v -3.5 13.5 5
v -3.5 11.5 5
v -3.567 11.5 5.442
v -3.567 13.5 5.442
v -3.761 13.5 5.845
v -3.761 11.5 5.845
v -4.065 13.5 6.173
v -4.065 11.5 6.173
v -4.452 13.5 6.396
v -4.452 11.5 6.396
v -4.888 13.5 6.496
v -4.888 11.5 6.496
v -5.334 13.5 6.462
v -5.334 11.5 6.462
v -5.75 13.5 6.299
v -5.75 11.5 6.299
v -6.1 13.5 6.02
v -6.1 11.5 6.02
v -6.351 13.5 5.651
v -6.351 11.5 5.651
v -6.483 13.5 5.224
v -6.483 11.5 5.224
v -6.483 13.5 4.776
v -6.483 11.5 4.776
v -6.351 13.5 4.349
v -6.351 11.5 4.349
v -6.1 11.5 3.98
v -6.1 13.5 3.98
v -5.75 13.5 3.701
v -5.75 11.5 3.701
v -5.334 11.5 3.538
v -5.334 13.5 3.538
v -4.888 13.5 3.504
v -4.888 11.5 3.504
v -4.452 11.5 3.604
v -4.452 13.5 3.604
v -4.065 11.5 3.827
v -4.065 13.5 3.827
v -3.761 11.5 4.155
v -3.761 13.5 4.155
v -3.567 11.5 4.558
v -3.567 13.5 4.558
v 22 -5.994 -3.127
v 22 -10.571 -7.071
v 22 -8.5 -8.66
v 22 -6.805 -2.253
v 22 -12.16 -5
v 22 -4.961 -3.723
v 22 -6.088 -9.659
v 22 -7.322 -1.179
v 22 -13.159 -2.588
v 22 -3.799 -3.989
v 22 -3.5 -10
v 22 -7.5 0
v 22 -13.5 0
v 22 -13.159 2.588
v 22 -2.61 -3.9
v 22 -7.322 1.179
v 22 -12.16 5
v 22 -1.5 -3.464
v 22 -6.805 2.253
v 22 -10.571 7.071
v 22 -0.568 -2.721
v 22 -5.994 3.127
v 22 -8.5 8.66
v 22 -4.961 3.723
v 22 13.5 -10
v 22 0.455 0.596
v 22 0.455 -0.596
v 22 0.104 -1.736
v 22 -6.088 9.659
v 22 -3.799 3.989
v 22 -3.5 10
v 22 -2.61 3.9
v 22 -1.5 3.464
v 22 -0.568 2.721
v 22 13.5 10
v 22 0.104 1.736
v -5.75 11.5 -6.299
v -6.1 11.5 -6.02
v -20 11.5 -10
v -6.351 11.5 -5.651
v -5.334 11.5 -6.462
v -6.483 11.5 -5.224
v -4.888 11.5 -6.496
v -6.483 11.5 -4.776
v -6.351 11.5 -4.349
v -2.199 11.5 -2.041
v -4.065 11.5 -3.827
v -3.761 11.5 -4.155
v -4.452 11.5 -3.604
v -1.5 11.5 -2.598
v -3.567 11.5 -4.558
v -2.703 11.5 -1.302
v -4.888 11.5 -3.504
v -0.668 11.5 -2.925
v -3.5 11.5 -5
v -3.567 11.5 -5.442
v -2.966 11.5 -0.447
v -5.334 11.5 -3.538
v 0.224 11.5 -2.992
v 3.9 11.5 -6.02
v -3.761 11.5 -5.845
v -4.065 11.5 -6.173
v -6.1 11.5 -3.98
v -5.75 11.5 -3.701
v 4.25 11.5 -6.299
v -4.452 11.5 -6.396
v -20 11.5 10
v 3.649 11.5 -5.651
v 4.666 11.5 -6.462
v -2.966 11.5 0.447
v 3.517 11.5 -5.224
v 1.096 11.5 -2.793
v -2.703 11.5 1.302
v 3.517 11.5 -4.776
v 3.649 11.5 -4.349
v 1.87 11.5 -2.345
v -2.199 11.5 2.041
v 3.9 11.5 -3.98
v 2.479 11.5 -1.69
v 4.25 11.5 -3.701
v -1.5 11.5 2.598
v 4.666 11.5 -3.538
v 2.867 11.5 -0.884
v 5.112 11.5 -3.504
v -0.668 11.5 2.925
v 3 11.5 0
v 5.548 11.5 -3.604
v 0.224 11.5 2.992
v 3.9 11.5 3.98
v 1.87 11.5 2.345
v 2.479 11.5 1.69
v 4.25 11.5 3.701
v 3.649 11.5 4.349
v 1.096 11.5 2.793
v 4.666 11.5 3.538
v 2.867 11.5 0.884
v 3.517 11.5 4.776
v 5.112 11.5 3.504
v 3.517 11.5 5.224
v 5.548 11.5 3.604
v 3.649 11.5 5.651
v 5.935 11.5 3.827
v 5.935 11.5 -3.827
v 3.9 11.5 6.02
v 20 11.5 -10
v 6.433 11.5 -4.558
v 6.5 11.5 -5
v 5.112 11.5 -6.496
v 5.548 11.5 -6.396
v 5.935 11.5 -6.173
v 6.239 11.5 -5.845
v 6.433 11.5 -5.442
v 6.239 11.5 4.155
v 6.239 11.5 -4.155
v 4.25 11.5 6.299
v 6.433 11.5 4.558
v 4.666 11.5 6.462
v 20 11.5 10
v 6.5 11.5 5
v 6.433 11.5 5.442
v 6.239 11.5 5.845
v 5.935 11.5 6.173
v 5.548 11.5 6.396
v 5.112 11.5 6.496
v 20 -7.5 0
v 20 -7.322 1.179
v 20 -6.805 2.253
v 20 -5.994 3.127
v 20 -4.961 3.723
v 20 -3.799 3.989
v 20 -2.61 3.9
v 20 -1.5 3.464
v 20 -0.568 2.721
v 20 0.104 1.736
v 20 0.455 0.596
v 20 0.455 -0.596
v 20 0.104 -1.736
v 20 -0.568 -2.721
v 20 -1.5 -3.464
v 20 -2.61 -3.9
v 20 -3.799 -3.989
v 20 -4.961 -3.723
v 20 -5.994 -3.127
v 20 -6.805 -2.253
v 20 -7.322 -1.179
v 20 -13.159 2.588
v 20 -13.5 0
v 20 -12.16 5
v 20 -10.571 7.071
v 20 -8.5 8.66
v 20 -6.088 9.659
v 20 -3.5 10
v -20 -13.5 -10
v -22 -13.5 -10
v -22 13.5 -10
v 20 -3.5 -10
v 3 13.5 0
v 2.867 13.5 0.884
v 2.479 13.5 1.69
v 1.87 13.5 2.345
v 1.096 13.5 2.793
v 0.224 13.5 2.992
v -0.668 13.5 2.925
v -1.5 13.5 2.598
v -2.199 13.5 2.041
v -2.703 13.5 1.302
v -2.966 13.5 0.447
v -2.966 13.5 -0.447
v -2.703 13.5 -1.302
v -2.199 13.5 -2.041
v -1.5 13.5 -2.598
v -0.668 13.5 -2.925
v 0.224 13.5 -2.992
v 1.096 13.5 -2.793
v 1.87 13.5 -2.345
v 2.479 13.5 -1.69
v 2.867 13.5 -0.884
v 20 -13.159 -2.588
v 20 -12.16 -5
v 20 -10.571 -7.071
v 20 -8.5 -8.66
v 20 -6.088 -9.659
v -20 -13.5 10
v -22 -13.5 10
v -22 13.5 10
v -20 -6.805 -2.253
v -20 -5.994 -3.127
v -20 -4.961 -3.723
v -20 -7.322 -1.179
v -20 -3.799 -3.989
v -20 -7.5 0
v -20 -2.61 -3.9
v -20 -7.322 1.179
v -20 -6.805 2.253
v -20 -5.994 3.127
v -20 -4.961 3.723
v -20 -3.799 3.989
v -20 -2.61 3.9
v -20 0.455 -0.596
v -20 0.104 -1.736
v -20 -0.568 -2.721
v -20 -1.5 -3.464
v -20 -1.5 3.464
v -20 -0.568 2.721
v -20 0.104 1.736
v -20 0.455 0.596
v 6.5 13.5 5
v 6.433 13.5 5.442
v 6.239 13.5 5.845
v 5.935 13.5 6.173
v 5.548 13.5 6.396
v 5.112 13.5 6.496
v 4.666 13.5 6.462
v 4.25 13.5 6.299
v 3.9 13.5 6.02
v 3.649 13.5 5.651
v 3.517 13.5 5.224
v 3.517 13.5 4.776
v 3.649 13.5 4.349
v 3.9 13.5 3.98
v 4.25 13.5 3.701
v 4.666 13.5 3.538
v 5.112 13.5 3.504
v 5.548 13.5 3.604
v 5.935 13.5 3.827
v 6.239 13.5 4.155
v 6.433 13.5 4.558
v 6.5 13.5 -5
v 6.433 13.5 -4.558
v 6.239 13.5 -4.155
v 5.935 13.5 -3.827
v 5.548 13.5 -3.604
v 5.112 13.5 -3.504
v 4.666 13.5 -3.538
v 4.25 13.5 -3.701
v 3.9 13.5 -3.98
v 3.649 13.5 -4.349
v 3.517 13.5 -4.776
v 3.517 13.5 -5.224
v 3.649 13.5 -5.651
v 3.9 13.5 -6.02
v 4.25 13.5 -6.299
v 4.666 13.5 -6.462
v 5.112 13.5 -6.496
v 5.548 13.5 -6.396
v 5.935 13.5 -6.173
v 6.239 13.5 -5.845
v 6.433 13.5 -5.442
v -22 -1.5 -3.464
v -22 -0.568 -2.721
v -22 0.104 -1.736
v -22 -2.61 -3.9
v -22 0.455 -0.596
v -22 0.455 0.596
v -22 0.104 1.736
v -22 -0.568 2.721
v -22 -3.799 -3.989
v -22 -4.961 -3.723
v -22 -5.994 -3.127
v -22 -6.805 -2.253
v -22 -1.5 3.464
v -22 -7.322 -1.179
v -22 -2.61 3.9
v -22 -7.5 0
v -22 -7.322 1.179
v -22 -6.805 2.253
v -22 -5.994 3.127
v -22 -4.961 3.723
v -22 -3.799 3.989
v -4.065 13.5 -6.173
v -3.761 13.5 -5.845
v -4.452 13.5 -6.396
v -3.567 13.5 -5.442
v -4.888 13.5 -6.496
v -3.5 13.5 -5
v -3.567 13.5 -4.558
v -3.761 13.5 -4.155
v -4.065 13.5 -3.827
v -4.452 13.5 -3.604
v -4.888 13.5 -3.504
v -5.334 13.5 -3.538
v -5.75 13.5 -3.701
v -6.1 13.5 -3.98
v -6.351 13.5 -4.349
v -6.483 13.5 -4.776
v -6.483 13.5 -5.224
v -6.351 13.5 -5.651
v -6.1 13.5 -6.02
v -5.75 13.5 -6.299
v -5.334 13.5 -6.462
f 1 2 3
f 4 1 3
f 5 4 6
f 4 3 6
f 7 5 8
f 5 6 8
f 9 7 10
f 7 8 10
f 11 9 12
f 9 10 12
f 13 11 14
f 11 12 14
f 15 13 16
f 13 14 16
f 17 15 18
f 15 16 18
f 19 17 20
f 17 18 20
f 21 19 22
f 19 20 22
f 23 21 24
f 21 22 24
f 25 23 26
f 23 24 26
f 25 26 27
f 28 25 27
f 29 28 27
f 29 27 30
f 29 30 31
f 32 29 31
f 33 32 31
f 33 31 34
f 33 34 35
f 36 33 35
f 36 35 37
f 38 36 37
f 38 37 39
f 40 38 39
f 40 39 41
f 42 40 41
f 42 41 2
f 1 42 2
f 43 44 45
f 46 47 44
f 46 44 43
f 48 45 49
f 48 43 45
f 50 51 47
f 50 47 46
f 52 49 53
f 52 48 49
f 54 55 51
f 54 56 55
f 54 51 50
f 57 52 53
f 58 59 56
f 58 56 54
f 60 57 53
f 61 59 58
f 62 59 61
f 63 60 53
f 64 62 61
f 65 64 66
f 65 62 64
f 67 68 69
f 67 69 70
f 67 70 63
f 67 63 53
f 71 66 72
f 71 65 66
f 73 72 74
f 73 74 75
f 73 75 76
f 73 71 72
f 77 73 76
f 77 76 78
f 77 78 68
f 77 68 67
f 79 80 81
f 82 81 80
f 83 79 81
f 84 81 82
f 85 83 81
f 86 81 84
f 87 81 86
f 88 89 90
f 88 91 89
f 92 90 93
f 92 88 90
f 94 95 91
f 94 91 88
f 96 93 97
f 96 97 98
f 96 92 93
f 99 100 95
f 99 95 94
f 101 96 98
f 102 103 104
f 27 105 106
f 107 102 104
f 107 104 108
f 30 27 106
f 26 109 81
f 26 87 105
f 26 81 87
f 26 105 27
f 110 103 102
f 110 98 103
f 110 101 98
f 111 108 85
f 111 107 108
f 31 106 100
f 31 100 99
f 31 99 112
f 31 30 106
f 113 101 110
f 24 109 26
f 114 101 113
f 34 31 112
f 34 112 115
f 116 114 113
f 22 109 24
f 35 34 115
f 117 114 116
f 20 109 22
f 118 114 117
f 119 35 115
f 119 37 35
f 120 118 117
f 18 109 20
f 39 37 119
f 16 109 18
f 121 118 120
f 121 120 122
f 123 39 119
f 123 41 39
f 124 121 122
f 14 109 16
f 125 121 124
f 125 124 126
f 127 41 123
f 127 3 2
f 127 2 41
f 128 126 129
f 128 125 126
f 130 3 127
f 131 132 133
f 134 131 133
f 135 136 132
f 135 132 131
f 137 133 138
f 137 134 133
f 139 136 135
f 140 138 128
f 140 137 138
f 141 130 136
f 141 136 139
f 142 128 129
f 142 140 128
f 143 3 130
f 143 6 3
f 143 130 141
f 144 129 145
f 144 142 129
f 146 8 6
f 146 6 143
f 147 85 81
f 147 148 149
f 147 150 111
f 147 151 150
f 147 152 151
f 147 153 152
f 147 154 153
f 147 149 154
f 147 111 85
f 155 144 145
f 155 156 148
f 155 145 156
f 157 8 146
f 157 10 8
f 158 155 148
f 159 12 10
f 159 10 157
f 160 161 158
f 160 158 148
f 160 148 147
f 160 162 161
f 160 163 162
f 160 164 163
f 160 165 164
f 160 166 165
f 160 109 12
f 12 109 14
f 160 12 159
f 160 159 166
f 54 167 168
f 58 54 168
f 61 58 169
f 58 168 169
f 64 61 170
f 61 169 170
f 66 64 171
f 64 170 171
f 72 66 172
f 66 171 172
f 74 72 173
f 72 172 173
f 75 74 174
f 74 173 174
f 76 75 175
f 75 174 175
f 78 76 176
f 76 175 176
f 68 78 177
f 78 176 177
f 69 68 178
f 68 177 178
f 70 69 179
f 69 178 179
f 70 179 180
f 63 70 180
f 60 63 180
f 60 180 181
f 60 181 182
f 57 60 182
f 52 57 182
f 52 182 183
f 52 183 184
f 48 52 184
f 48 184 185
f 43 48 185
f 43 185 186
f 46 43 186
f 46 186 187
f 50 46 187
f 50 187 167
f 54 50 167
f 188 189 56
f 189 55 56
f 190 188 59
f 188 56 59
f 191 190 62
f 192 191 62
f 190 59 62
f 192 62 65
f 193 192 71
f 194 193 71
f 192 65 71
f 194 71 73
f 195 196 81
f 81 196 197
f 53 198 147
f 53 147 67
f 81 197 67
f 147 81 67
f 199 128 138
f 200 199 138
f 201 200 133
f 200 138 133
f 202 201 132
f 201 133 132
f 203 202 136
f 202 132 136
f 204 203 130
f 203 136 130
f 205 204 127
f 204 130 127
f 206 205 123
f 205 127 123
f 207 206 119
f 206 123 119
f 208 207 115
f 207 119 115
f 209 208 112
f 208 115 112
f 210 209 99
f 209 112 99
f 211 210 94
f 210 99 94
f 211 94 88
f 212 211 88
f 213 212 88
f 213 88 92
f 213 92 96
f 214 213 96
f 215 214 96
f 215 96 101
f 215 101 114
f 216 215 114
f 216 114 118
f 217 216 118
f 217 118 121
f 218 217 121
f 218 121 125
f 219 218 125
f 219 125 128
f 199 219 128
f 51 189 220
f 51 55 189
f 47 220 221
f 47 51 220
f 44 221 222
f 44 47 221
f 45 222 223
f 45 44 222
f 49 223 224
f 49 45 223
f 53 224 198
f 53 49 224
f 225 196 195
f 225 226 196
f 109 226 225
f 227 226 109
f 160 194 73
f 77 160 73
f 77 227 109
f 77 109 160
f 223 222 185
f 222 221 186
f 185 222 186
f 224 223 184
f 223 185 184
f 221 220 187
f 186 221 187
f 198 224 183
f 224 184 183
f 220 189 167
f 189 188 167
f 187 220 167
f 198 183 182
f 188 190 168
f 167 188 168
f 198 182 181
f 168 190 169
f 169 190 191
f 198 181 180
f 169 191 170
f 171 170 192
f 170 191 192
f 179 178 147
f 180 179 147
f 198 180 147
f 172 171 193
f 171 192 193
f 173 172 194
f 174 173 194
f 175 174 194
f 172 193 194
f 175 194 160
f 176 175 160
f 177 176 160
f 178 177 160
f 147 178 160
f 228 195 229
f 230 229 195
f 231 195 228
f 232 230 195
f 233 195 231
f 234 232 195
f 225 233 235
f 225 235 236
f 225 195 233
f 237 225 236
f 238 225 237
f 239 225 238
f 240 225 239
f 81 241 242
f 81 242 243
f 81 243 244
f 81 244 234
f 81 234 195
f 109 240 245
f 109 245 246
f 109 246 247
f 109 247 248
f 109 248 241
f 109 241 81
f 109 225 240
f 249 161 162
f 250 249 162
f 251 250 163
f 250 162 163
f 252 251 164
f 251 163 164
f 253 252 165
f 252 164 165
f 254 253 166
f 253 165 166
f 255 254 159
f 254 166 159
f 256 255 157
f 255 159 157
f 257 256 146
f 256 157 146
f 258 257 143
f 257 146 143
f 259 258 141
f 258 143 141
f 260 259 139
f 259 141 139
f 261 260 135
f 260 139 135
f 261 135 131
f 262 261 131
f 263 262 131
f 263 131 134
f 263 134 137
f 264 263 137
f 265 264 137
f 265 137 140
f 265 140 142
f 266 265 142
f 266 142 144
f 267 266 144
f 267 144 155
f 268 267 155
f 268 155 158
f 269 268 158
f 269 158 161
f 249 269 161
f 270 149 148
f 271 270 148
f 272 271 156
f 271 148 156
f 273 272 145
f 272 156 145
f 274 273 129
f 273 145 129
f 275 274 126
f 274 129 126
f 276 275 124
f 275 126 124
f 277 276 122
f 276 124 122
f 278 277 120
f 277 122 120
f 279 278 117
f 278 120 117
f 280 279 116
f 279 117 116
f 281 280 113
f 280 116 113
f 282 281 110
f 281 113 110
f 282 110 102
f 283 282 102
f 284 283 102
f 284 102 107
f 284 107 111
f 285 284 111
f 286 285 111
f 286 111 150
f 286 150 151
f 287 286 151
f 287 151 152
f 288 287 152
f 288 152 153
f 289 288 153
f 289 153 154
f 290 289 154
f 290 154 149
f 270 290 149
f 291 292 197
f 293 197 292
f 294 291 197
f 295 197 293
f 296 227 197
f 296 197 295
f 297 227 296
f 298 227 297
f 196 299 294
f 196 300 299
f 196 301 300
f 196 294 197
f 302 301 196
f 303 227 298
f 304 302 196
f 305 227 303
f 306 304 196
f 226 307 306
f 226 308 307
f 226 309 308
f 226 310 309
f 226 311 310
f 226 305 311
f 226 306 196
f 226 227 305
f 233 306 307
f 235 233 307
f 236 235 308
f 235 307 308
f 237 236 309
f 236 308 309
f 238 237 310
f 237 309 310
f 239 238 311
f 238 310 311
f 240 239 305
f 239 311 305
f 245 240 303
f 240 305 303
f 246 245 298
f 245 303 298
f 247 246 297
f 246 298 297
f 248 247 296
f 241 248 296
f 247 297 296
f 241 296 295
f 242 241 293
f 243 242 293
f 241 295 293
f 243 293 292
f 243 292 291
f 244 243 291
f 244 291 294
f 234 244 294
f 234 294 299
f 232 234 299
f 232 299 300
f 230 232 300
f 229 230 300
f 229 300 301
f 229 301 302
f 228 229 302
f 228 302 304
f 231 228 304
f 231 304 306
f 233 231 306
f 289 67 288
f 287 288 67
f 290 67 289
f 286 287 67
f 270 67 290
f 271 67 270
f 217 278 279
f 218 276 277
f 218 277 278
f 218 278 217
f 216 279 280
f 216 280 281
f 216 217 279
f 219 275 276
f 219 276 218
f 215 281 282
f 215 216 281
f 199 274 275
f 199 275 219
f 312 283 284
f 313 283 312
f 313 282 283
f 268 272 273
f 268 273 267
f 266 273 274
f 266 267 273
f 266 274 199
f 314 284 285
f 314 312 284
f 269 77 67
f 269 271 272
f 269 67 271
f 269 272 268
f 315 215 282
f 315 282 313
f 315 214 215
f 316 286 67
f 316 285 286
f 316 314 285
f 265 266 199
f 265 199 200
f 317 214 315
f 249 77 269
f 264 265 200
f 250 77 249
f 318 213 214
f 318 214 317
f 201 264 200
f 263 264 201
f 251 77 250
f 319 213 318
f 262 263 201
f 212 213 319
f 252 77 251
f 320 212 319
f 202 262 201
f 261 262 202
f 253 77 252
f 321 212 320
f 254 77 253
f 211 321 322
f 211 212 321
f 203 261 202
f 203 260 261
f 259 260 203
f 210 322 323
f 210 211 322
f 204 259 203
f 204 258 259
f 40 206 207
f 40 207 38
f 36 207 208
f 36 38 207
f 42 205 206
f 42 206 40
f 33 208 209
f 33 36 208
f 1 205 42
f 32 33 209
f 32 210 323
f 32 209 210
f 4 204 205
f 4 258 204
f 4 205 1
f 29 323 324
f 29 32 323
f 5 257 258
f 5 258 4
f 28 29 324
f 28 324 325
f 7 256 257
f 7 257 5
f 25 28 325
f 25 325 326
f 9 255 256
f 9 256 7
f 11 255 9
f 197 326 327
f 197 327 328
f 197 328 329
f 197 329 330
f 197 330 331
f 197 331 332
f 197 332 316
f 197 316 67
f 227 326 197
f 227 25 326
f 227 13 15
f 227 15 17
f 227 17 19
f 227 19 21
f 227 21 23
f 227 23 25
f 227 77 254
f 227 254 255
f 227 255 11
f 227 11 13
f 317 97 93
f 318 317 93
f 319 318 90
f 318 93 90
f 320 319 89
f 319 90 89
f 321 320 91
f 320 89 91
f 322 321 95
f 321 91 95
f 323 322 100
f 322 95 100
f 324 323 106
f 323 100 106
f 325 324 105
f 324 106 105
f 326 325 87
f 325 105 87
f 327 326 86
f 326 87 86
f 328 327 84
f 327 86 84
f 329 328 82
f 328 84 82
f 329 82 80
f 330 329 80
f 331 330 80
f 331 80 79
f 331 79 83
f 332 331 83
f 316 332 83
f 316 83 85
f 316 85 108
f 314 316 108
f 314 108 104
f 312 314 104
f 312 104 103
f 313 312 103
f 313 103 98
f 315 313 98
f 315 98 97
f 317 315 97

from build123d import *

# Parameters (mm, degrees)
F0_W     = 2
F0_H     = 25
F1_DEPTH = 10
F2_R     = 9.99999
F4_D     = 6
F6_D     = 3
F8_D     = 8


# Not quite as in the source:
# - a fillet or chamfer is up to 0.001 mm smaller than in the source, because OpenCascade refuses the exact size


with BuildPart() as f1:
    # F0 (on Top) → F1 (new body, symmetric)
    with BuildSketch(Plane.XY):
        with Locations((-21, -1)):
            Rectangle(F0_W, F0_H)
        Polygon((-22, 13.5), (-22, 11.5), (-20, 11.5), (20, 11.5), (22, 11.5), (22, 13.5), align=None)
        with Locations((21, -1)):
            Rectangle(F0_W, F0_H)
    extrude(amount=F1_DEPTH, both=True)

    # F2 (radius 10 in the source; OpenCascade refuses exactly that, so slightly less here)
    f2_edges = [f1.edges().sort_by_distance(p)[0] for p in [
        (21, -13.5, 10),
        (21, -13.5, -10),
    ]]
    fillet(f2_edges, radius=F2_R)

    # F4 (through all)
    with Locations(Plane(origin=(0, 13.5, 0), x_dir=(-1, 0, 0), z_dir=(0, 1, 0))):
        with Locations((0, 0)):
            Hole(F4_D / 2)

    # F6 (through all)
    with Locations(Plane(origin=(0, 13.5, 0), x_dir=(-1, 0, 0), z_dir=(0, 1, 0))):
        with Locations((-5, 5), (5, 5), (5, -5), (-5, -5)):
            Hole(F6_D / 2)

    # F8 (through all)
    with Locations(Plane.YZ.offset(22)):
        with Locations((-3.5, 0)):
            Hole(F8_D / 2)


solid = f1.part
